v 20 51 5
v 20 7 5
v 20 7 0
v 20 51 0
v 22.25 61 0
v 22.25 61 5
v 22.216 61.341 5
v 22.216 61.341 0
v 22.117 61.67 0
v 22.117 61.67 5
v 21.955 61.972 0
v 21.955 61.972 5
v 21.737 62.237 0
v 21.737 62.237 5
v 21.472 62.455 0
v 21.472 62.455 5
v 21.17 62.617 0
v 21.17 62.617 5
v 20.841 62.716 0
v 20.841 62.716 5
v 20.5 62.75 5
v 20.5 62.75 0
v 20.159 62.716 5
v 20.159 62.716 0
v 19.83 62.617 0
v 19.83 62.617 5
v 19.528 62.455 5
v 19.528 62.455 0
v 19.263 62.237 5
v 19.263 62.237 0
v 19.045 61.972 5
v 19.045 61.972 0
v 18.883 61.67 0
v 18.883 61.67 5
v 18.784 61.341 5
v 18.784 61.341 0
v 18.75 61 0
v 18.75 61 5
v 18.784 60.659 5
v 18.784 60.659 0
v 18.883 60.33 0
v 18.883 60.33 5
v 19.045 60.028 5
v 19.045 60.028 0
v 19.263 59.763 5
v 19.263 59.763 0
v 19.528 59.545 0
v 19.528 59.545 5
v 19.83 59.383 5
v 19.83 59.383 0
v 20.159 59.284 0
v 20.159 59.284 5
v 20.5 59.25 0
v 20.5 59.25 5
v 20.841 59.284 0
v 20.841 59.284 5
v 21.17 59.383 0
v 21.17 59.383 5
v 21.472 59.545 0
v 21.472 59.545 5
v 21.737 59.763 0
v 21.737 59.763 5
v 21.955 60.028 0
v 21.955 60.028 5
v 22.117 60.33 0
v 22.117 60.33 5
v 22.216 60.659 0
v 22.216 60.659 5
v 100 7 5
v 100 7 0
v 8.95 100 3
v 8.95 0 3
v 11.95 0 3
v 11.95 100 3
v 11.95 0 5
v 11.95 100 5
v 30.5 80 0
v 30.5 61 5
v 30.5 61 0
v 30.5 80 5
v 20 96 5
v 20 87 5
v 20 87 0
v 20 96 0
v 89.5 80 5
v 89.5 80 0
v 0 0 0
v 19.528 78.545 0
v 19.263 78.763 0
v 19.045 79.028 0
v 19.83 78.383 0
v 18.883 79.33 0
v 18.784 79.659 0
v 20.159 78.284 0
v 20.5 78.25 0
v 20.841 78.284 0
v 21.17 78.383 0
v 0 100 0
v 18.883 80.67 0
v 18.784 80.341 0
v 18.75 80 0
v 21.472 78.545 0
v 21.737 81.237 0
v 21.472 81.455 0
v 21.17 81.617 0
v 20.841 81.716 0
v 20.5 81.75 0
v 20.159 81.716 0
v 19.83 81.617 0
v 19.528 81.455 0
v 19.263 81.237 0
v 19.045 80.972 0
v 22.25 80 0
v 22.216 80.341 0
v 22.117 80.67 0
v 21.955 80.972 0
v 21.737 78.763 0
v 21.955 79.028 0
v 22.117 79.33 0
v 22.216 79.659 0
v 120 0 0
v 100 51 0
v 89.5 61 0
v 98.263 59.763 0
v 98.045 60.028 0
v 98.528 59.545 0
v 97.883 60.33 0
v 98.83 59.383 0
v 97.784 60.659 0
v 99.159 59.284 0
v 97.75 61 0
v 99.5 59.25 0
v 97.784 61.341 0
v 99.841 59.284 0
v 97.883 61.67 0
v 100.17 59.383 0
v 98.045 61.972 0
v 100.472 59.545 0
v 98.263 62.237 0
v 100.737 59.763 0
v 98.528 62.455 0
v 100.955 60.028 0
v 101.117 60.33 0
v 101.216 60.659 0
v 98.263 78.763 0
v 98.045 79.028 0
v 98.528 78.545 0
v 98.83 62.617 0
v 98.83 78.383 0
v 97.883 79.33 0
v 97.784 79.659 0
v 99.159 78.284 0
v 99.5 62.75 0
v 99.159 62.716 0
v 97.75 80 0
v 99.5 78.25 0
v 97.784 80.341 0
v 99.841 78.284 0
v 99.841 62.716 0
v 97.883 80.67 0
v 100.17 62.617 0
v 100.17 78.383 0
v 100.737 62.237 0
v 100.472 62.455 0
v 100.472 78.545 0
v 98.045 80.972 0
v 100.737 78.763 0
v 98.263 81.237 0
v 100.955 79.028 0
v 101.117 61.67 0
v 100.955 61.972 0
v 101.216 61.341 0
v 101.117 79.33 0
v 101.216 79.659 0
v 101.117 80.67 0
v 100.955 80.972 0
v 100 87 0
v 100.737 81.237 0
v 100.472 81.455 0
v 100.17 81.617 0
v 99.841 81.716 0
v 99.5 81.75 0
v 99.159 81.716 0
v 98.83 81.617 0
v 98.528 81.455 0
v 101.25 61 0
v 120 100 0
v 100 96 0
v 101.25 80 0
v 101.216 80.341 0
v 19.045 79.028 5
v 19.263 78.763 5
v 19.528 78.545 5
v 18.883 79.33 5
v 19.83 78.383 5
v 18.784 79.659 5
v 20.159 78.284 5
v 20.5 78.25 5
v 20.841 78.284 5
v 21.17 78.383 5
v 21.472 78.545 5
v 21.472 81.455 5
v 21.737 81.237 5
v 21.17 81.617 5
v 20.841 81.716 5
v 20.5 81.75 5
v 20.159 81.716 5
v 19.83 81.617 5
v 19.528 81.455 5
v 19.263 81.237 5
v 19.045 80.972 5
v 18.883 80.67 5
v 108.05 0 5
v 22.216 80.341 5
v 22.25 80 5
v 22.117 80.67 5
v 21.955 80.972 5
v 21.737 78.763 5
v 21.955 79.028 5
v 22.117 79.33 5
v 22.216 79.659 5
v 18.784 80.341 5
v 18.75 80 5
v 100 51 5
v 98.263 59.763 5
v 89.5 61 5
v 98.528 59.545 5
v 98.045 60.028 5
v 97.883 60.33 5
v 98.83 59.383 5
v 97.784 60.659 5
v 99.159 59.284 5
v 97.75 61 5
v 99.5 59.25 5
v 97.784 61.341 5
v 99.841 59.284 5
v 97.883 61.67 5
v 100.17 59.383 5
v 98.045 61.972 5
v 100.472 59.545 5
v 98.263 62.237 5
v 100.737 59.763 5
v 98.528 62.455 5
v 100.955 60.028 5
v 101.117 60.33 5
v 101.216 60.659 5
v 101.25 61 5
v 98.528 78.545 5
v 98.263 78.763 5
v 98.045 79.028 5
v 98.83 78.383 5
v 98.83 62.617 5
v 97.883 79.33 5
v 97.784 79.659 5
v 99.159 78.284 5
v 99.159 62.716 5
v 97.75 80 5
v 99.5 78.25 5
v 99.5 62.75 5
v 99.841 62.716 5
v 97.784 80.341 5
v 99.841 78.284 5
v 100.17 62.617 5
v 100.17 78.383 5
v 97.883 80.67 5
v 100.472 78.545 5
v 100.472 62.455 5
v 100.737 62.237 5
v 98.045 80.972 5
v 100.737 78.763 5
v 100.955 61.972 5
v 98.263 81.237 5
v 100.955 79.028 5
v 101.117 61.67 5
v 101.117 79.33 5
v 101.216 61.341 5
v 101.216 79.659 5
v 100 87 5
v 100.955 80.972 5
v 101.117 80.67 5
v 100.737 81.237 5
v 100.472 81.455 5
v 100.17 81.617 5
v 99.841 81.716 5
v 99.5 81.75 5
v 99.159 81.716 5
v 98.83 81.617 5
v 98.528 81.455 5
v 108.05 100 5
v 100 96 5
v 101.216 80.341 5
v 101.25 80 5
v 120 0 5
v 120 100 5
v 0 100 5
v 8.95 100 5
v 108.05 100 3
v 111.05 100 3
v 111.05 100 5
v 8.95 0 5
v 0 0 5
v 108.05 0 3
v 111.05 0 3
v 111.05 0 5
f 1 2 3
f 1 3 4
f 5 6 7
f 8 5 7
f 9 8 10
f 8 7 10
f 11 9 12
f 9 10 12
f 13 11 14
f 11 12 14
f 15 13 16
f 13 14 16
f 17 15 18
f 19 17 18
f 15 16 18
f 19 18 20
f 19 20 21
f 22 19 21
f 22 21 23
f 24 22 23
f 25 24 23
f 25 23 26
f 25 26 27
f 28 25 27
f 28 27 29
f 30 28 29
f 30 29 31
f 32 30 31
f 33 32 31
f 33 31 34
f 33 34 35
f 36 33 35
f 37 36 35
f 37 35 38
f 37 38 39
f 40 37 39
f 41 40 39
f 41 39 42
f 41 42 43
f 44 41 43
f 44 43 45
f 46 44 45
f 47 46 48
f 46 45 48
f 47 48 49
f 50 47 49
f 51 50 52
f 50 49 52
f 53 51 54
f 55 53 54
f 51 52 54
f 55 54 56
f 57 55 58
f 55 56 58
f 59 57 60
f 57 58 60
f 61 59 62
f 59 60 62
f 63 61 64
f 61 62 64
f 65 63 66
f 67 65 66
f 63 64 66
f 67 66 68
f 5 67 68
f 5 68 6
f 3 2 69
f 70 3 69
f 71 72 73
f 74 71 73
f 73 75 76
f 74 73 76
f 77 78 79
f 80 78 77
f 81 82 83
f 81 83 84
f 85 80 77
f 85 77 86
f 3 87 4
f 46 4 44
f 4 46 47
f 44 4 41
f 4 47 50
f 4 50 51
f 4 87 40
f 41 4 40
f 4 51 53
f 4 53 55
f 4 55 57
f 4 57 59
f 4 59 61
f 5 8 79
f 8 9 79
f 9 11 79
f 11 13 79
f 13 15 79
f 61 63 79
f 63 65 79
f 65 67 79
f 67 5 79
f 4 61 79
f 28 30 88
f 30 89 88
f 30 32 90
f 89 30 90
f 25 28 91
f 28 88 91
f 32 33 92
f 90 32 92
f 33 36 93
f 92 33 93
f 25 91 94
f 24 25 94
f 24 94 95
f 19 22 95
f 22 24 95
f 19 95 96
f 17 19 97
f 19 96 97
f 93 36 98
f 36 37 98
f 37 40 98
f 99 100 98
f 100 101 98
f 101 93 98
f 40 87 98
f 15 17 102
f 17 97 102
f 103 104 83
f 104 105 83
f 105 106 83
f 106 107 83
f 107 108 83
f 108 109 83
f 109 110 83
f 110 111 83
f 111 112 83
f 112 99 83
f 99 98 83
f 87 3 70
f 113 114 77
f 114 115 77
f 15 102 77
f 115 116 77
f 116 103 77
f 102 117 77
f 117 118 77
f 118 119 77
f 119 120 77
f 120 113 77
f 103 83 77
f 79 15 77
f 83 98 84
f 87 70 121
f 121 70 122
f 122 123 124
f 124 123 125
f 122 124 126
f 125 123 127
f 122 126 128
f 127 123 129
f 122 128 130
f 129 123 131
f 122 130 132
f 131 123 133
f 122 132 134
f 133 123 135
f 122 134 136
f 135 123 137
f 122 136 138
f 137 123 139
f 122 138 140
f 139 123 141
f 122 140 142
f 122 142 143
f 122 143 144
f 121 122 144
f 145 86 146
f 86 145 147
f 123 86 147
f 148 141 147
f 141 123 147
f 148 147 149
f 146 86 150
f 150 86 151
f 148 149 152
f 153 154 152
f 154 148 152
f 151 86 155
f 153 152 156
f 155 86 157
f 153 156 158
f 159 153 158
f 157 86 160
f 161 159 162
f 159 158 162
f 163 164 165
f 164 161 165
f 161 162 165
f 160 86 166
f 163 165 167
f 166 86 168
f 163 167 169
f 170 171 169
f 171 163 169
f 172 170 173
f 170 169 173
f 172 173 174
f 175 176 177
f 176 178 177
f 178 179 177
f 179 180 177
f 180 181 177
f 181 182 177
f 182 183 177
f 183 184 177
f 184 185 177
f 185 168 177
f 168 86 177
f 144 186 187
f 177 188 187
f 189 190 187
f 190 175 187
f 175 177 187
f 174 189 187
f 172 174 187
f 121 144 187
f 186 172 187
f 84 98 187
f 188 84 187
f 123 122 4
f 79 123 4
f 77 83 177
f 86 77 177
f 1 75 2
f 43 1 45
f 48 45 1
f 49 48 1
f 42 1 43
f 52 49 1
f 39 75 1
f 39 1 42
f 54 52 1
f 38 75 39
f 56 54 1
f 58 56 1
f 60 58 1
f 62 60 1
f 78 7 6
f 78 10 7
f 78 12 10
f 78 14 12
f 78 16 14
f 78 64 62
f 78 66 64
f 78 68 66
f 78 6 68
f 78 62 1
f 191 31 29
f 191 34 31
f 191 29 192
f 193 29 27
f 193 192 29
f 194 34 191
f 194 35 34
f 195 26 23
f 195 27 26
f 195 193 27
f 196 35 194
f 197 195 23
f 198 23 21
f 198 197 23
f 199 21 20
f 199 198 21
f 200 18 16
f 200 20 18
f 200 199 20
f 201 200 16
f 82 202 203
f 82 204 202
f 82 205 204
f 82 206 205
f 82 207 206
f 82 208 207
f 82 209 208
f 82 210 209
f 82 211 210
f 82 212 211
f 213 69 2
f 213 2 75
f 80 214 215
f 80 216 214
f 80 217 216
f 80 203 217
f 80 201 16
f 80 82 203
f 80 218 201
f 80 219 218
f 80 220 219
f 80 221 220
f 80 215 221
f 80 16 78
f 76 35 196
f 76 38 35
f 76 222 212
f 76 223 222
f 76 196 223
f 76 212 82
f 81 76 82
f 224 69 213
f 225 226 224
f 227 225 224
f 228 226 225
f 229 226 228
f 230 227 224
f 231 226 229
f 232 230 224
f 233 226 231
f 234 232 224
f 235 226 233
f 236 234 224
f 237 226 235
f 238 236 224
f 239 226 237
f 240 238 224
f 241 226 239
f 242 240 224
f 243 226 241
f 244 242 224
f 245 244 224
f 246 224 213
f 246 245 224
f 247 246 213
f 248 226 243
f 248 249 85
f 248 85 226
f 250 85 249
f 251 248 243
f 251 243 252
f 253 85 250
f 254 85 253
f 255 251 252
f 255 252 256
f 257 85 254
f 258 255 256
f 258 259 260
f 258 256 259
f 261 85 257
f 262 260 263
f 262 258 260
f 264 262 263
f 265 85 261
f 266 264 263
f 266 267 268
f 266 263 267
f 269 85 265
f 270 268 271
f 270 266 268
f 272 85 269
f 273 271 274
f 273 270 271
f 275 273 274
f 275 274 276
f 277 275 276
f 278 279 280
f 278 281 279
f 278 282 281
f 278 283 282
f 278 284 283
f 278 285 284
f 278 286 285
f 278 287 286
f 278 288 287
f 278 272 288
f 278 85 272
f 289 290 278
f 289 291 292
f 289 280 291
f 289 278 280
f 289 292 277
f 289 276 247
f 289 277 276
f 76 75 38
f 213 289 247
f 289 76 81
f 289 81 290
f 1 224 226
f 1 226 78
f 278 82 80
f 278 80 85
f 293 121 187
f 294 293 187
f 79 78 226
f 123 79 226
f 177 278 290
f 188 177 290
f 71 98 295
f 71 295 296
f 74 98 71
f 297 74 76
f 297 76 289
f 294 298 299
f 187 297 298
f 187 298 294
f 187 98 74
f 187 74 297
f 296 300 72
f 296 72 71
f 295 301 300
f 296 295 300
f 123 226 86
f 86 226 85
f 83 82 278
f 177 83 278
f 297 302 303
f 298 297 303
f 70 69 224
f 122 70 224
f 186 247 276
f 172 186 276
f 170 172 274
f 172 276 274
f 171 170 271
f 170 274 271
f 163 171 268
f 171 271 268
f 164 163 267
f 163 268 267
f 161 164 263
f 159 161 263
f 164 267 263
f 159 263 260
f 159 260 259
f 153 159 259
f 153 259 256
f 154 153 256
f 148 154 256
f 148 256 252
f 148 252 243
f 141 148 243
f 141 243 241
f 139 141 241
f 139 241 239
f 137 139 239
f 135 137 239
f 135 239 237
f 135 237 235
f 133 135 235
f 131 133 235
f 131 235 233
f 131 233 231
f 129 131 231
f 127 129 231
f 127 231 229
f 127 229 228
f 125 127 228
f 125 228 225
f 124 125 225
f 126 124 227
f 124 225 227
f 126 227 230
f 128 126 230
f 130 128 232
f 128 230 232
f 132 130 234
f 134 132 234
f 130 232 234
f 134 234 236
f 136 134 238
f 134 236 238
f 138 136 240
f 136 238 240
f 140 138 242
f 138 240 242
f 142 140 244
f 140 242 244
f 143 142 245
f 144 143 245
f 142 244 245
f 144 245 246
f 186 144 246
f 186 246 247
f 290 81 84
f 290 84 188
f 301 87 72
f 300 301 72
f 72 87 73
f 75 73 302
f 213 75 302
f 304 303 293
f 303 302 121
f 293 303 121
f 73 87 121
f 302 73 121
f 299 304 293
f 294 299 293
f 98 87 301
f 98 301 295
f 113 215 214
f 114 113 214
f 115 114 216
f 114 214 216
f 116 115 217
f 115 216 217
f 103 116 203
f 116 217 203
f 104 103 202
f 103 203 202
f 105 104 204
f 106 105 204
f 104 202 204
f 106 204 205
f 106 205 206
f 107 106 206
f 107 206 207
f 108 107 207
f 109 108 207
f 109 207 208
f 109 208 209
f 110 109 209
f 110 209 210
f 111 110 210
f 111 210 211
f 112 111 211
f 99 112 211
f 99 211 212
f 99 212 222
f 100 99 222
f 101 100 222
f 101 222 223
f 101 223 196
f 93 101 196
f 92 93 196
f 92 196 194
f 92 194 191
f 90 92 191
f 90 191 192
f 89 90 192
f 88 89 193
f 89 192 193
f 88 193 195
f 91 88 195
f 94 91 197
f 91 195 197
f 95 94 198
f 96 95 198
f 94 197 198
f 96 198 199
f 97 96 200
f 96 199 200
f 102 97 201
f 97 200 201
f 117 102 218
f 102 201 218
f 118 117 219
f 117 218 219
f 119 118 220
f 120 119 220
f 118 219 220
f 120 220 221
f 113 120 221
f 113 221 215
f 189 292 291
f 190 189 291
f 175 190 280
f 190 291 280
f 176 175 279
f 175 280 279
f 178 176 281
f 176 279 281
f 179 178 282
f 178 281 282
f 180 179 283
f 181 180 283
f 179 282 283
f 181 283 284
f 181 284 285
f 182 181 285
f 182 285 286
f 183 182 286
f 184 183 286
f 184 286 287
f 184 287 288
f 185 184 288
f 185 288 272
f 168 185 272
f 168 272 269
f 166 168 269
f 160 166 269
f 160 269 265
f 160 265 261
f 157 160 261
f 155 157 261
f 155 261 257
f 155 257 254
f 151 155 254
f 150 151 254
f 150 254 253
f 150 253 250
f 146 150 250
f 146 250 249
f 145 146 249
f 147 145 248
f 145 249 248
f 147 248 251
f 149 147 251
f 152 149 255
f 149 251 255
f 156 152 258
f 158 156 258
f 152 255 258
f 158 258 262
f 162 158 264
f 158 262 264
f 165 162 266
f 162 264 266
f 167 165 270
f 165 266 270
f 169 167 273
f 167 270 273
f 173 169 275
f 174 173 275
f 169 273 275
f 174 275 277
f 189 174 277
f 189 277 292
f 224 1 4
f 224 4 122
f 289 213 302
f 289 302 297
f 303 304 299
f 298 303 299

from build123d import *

# Parameters (mm, degrees)
SKETCH_1_W          = 120
SKETCH_1_H          = 100
EXTRUDE_1_DEPTH     = 5
SKETCH_2_W          = 3
SKETCH_2_H          = 100
CUT_EXTRUDE_1_DEPTH = 2
SKETCH_3_R          = 1.75
SKETCH_3_W          = 80
SKETCH_3_H          = 44
SKETCH_3_H_2        = 9
SKETCH_3_W_2        = 59
SKETCH_3_H_3        = 19
CUT_EXTRUDE_2_DEPTH = 157.284996081


with BuildPart() as part:
    # 草图1 → 凸台-拉伸1 (new body)
    with BuildSketch(Plane.XY):
        with Locations((60, 50)):
            Rectangle(SKETCH_1_W, SKETCH_1_H)
    extrude(amount=EXTRUDE_1_DEPTH)

    # 草图2 → 切除-拉伸1 (cut)
    with BuildSketch(Plane.XY.offset(5)):
        with Locations((10.45, 50)):
            Rectangle(SKETCH_2_W, SKETCH_2_H)
        with Locations((109.55, 50)):
            Rectangle(SKETCH_2_W, SKETCH_2_H)
    extrude(amount=-CUT_EXTRUDE_1_DEPTH, mode=Mode.SUBTRACT)

    # 草图3 → 切除-拉伸2 (cut, through all)
    with BuildSketch(Plane.XY.offset(5)):
        with Locations((20.5, 80)):
            Circle(SKETCH_3_R)
        with Locations((20.5, 61)):
            Circle(SKETCH_3_R)
        with Locations((99.5, 80)):
            Circle(SKETCH_3_R)
        with Locations((99.5, 61)):
            Circle(SKETCH_3_R)
        with Locations((60, 29)):
            Rectangle(SKETCH_3_W, SKETCH_3_H)
        with Locations((60, 91.5)):
            Rectangle(SKETCH_3_W, SKETCH_3_H_2)
        with Locations((60, 70.5)):
            Rectangle(SKETCH_3_W_2, SKETCH_3_H_3)
    extrude(amount=-CUT_EXTRUDE_2_DEPTH, mode=Mode.SUBTRACT)


solid = part.part
